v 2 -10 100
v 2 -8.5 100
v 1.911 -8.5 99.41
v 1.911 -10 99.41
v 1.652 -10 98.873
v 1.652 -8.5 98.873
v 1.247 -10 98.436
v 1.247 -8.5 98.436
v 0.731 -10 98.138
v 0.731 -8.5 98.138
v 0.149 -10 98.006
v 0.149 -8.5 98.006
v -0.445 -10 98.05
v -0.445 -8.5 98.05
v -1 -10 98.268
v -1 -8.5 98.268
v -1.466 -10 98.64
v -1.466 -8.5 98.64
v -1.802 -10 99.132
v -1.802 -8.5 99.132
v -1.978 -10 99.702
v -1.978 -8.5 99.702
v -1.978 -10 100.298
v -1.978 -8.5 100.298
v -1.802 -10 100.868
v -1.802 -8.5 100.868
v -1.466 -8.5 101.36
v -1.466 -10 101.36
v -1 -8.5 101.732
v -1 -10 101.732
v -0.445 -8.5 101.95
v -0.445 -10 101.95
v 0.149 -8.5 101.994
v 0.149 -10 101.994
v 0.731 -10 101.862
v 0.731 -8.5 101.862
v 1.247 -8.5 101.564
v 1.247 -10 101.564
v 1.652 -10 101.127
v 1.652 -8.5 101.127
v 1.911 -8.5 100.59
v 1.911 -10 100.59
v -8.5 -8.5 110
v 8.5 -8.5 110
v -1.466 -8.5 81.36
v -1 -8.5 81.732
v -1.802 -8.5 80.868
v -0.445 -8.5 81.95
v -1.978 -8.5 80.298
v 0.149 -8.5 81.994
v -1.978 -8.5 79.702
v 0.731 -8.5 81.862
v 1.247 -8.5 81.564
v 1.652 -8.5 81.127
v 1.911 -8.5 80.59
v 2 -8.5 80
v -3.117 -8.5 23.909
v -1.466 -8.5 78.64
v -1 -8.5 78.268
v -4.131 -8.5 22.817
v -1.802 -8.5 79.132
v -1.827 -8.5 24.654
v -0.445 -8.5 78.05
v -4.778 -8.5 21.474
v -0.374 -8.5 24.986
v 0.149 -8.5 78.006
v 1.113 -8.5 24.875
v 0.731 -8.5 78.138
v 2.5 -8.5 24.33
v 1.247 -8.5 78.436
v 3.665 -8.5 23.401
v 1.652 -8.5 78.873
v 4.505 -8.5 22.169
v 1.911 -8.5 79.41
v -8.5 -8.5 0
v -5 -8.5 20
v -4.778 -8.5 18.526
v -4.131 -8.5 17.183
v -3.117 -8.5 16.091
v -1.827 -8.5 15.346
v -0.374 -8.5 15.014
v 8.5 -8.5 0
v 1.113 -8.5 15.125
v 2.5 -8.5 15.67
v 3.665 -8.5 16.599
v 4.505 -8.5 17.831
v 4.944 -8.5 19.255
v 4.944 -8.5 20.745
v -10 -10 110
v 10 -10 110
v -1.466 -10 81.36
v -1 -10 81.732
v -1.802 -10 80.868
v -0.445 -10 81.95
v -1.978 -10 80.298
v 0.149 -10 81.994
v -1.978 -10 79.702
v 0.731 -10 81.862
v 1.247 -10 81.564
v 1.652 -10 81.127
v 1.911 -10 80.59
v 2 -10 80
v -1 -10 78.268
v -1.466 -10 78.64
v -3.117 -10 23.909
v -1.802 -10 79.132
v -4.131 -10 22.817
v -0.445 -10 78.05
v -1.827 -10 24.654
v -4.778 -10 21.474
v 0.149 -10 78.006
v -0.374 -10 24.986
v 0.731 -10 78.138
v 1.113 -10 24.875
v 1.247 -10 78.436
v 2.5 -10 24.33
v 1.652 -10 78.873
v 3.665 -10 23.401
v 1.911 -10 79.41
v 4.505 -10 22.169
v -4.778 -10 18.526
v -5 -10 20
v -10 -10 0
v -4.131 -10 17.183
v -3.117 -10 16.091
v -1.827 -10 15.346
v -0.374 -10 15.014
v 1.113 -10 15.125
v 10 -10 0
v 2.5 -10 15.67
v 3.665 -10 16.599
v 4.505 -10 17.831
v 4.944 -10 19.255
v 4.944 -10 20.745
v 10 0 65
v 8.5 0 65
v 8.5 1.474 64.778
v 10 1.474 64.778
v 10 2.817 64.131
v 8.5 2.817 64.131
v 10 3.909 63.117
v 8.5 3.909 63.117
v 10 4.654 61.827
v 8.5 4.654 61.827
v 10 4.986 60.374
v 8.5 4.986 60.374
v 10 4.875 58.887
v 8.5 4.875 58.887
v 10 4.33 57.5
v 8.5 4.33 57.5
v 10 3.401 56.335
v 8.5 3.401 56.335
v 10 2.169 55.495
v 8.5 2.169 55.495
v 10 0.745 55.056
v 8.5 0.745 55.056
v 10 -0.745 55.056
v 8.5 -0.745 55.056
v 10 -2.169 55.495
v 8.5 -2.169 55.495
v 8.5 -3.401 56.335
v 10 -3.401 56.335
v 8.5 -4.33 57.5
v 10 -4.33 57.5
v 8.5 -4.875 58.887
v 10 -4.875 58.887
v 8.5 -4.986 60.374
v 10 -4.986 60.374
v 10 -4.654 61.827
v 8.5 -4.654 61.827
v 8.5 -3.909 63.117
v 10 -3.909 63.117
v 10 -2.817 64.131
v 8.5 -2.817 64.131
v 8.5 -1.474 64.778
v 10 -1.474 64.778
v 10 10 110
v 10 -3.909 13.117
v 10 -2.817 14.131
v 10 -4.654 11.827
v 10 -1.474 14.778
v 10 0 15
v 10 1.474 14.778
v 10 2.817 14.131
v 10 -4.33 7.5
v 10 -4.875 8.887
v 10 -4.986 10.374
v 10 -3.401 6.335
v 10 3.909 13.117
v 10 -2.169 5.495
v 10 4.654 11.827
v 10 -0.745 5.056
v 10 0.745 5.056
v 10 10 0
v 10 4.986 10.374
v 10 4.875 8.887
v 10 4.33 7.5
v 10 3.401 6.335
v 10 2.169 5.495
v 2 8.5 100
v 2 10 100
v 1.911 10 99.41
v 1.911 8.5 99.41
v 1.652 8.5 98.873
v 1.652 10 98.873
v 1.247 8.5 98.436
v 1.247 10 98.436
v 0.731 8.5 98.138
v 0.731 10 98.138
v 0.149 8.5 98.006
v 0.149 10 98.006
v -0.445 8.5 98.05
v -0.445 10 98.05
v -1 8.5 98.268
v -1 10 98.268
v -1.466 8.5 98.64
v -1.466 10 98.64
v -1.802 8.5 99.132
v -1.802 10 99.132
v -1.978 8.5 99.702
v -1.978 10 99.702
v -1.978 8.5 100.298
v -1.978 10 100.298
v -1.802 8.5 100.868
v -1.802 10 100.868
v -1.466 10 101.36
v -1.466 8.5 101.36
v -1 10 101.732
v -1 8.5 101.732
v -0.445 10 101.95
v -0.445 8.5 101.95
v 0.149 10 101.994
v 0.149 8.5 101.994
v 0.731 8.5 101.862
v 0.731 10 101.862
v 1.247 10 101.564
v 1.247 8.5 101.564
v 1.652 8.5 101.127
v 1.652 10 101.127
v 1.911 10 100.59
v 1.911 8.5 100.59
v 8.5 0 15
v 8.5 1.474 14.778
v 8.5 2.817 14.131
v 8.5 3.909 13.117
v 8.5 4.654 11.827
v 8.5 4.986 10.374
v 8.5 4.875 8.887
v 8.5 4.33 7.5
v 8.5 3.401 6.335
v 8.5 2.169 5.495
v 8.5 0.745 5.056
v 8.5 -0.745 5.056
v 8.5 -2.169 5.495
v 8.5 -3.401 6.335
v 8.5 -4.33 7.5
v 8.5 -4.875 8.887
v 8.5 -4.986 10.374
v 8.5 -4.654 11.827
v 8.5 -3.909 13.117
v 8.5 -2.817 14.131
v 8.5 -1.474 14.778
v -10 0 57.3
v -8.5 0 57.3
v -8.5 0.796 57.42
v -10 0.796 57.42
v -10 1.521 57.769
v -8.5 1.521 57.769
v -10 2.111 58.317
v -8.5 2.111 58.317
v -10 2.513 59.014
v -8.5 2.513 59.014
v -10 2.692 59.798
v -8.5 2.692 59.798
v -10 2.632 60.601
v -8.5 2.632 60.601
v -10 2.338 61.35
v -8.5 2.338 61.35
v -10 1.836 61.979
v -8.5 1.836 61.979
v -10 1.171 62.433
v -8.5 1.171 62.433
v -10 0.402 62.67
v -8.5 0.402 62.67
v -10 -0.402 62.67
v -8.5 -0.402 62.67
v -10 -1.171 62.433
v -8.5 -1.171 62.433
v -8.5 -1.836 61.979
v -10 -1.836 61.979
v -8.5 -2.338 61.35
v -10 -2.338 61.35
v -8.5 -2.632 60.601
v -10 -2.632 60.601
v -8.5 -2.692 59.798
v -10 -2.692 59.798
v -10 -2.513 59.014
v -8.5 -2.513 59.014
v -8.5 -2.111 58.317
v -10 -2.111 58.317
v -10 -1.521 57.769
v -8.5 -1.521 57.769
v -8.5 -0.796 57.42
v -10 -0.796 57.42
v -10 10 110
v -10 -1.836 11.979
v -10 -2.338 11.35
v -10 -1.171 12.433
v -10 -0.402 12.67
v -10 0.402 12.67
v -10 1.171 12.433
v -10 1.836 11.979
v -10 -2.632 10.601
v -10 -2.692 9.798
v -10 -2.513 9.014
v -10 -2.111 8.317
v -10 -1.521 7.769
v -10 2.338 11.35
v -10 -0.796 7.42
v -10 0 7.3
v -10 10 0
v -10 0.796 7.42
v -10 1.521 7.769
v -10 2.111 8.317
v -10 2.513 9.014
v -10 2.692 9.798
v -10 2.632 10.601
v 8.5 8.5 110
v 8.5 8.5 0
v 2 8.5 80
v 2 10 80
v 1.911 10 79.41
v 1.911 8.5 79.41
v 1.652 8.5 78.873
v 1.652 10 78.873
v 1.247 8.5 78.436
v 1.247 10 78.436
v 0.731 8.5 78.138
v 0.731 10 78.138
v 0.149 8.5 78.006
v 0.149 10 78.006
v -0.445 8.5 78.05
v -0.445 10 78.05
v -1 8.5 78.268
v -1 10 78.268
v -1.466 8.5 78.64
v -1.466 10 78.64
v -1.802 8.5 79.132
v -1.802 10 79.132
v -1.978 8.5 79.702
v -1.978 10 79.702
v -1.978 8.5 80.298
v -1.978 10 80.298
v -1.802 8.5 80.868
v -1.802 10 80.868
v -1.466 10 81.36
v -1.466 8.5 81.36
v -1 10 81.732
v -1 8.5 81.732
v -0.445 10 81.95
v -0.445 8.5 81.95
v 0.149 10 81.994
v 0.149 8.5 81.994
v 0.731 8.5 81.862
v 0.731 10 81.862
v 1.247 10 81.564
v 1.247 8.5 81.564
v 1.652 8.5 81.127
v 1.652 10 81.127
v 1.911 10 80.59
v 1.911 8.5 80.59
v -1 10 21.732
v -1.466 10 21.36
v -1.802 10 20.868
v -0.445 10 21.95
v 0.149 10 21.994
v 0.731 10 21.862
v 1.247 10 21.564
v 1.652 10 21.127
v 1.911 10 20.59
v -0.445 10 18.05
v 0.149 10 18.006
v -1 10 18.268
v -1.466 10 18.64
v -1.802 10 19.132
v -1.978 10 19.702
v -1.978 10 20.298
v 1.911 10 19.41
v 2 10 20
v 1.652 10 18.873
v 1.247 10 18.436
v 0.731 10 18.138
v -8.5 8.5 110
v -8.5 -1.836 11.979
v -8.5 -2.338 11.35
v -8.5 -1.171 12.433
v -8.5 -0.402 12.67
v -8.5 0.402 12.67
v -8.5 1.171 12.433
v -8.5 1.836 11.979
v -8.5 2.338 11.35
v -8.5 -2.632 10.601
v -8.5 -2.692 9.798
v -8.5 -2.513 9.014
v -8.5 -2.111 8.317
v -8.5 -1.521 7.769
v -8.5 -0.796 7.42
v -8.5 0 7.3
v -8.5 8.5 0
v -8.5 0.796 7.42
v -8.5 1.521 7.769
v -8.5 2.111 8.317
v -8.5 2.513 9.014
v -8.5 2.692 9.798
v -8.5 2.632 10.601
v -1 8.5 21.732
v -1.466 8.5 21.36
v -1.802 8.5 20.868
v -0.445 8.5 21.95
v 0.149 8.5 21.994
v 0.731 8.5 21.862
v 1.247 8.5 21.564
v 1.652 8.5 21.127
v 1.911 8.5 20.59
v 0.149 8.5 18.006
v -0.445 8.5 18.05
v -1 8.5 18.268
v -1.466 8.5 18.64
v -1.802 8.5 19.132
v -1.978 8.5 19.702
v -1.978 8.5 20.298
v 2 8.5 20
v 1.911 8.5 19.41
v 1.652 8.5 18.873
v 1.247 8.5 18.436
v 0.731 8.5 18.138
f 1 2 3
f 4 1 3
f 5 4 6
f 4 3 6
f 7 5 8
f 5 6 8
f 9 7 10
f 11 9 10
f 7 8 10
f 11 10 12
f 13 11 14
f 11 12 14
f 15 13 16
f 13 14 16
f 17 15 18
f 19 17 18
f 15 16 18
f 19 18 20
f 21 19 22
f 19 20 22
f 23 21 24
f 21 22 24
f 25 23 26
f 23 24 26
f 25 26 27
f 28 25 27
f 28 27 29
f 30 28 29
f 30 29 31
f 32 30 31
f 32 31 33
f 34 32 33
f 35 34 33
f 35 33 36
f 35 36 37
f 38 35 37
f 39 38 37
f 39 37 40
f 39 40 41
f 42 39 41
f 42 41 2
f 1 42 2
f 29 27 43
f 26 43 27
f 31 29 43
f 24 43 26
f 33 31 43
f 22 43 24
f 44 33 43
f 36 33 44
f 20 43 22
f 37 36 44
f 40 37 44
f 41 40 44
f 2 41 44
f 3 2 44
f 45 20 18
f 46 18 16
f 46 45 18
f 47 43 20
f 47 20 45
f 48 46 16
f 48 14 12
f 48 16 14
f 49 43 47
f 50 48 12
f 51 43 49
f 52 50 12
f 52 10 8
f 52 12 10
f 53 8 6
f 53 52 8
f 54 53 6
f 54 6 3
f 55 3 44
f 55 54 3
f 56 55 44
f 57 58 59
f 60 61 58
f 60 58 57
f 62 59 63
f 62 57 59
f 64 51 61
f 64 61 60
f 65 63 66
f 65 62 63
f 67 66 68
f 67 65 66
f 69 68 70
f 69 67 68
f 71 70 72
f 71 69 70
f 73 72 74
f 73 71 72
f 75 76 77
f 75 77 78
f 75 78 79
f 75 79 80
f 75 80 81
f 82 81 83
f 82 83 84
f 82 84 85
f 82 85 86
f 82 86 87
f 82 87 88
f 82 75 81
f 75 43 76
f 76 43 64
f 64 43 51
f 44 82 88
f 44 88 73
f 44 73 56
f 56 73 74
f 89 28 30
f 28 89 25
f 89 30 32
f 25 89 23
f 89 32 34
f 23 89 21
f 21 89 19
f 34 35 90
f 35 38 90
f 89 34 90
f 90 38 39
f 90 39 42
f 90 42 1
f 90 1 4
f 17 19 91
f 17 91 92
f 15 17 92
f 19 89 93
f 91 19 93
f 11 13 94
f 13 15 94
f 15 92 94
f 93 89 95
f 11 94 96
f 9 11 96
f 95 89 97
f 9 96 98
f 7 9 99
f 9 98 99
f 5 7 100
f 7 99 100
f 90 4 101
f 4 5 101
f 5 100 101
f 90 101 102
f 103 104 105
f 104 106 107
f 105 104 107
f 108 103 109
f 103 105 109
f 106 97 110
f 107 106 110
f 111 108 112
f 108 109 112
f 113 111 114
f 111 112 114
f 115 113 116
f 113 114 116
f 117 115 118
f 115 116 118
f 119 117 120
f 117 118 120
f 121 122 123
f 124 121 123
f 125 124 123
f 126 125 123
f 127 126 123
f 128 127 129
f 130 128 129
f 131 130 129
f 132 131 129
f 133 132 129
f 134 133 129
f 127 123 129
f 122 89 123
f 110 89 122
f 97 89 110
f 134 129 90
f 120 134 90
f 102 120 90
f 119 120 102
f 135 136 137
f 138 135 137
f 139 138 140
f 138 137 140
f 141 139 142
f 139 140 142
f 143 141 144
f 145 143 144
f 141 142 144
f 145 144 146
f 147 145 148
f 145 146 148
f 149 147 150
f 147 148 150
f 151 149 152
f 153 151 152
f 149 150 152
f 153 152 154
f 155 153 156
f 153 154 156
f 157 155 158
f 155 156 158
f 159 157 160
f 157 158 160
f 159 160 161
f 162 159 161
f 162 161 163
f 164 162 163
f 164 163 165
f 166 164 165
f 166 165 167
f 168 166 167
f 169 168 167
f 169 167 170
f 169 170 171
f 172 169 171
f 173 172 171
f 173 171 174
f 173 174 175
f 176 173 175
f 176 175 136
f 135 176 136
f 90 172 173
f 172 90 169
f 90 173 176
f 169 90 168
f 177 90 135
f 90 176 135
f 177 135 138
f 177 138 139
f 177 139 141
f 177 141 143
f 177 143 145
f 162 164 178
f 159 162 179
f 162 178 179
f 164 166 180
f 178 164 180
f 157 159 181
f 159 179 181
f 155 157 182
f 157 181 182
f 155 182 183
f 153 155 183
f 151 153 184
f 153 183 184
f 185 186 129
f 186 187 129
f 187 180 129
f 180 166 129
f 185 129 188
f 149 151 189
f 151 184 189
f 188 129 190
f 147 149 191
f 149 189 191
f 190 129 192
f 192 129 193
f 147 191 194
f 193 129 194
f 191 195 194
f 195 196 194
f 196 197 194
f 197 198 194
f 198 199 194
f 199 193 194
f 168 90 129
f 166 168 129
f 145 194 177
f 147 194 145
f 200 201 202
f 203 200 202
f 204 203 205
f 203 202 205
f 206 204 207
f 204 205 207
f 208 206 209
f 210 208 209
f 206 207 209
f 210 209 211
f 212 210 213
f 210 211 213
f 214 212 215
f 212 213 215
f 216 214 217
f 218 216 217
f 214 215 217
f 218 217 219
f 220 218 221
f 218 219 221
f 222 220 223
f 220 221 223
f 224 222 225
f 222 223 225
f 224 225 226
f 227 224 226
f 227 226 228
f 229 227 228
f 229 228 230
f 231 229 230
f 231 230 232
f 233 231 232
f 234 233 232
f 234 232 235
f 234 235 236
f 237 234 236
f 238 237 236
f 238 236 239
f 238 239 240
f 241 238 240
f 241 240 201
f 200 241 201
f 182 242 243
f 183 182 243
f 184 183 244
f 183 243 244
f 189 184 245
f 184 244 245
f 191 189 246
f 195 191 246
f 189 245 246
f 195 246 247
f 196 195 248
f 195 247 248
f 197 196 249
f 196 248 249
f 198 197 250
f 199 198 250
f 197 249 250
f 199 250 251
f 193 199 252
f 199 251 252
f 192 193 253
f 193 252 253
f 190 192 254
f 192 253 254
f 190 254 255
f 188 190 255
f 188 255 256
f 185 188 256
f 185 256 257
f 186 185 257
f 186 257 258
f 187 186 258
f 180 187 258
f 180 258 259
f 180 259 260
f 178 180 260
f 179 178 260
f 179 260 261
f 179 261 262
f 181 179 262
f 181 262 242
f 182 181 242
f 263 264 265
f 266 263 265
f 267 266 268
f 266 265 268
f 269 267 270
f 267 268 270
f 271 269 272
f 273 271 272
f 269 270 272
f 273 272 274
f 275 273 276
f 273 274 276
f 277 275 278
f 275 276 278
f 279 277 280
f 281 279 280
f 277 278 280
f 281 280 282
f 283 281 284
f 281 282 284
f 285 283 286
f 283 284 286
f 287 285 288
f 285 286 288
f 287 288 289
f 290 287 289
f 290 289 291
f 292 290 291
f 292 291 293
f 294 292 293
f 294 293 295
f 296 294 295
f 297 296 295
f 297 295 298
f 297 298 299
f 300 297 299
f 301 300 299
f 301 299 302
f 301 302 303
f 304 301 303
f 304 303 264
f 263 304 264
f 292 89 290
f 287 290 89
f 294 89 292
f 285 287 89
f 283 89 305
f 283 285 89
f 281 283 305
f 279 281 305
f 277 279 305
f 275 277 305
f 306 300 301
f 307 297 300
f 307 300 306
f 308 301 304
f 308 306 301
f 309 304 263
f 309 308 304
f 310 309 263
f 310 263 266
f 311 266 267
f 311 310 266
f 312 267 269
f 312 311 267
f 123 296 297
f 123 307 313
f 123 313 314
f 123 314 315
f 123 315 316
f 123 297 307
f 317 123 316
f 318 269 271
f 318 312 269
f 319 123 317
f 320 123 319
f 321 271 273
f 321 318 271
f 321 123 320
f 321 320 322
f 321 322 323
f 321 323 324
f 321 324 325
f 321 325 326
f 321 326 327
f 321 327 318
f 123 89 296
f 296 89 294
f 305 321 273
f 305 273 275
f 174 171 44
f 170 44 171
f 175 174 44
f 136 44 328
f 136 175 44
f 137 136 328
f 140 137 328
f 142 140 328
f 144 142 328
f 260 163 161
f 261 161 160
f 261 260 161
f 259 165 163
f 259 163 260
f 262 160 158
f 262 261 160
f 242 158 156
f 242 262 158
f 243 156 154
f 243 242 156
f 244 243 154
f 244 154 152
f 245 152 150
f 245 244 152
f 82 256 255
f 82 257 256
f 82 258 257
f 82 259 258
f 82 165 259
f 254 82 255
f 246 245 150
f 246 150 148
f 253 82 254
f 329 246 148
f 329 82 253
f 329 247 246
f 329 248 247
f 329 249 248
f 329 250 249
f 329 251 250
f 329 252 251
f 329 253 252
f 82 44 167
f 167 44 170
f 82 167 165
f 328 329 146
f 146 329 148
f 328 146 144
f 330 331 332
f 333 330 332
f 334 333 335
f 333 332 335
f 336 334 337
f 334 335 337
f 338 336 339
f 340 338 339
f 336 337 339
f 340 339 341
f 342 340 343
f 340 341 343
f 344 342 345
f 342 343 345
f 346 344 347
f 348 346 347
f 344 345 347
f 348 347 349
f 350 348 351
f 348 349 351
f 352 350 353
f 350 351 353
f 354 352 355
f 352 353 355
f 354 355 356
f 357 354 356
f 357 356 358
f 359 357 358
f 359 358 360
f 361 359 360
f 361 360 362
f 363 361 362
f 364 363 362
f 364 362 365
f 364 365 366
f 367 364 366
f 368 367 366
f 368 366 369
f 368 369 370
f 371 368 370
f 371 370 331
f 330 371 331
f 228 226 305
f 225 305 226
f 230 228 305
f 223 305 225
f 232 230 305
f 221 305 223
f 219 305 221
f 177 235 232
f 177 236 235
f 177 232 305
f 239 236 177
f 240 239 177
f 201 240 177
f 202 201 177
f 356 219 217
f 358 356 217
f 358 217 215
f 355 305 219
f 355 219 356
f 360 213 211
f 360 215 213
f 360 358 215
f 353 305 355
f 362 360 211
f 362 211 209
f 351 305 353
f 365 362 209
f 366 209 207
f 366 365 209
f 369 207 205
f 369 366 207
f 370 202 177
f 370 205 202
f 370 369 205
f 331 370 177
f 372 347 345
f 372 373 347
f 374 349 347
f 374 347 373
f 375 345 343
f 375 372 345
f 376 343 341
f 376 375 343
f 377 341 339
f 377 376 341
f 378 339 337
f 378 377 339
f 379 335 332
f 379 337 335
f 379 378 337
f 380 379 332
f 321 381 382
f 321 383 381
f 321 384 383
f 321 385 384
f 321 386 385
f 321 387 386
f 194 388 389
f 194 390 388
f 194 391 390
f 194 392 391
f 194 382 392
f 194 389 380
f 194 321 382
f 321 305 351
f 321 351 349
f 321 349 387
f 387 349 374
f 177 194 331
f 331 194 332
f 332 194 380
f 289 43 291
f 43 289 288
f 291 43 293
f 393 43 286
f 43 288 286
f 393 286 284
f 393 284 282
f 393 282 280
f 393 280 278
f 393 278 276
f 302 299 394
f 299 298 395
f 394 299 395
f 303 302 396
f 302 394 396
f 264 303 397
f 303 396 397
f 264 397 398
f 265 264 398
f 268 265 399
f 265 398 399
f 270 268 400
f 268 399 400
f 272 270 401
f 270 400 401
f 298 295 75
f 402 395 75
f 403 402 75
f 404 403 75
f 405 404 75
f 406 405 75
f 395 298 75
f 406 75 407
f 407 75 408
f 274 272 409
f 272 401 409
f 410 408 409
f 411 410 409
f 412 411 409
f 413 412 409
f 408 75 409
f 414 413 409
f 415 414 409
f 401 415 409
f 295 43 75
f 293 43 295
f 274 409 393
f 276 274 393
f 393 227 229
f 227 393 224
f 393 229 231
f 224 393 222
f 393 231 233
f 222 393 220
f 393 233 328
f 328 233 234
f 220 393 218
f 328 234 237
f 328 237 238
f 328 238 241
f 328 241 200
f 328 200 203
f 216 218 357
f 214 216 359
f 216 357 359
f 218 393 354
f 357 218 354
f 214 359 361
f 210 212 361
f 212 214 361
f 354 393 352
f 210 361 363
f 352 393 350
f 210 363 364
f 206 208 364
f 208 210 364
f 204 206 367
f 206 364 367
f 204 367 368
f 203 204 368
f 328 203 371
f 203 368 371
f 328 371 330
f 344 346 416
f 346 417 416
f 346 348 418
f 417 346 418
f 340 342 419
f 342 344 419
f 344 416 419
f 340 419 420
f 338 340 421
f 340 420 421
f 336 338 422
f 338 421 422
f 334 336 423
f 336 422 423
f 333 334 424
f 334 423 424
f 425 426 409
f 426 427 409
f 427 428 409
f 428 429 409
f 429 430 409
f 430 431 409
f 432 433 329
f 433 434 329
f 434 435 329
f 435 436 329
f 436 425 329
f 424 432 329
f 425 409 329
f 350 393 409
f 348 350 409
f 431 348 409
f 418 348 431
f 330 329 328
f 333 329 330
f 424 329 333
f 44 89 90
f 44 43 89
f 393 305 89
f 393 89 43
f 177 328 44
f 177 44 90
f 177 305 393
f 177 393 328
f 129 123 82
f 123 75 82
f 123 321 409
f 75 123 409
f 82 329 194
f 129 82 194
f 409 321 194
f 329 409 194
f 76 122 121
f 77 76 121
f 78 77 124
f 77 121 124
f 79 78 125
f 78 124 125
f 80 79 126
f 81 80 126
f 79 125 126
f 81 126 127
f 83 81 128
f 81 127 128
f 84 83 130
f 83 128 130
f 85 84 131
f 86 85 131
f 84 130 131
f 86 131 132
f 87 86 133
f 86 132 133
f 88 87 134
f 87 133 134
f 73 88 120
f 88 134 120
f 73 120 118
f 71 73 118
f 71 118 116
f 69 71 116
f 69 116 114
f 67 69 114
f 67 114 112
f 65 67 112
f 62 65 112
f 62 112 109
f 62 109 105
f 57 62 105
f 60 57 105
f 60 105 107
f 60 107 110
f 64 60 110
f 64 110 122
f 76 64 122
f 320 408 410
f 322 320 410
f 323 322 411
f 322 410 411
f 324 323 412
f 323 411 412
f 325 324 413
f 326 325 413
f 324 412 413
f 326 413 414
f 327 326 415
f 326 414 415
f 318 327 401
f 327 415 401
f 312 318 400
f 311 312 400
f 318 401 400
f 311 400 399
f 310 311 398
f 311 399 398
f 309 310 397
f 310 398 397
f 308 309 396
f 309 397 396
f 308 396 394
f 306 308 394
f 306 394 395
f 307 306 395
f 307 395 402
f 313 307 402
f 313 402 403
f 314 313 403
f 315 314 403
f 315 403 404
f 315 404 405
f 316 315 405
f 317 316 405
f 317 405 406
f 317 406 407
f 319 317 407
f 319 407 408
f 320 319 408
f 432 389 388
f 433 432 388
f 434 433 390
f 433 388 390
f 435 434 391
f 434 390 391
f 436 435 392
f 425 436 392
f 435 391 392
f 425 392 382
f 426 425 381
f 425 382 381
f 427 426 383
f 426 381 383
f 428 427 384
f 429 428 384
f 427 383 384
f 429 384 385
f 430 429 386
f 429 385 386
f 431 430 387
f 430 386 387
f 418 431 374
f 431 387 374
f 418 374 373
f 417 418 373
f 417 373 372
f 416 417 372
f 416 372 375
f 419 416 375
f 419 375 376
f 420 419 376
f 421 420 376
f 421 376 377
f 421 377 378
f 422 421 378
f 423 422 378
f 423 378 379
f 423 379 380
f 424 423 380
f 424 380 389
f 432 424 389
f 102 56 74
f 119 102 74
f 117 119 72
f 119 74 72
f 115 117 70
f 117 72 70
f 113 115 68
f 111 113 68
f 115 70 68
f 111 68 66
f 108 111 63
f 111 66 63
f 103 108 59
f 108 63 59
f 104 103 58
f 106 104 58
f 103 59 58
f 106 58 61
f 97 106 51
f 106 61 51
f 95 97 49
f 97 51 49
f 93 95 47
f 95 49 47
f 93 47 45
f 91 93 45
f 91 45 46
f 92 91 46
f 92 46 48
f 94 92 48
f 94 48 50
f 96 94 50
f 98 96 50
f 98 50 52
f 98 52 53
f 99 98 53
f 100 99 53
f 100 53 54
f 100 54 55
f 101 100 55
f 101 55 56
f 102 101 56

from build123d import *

# Parameters (mm, degrees)
SKETCH_1_W          = 20
SKETCH_1_H          = 20
SKETCH_1_W_2        = 17
SKETCH_1_H_2        = 17
EXTRUDE_1_DEPTH     = 110
SKETCH_2_R          = 2.7
CUT_EXTRUDE_1_DEPTH = 25
SKETCH_3_R          = 2
CUT_EXTRUDE_2_DEPTH = 20
SKETCH_5_R          = 5
CUT_EXTRUDE_4_DEPTH = 10
CUT_EXTRUDE_START   = -10
SKETCH_6_R          = 5
CUT_EXTRUDE_5_DEPTH = 10


with BuildPart() as part:
    # ｽｹｯﾁ1 → ﾎﾞｽ - 押し出し1 (new body)
    with BuildSketch(Plane.XY):
        Rectangle(SKETCH_1_W, SKETCH_1_H)
        Rectangle(SKETCH_1_W_2, SKETCH_1_H_2, mode=Mode.SUBTRACT)
    extrude(amount=EXTRUDE_1_DEPTH)

    # ｽｹｯﾁ2 → ｶｯﾄ - 押し出し1 (cut)
    with BuildSketch(Plane(origin=(10, 0, 0), x_dir=(0, 0, -1), z_dir=(1, 0, 0))):
        with Locations((-60, 0)):
            Circle(SKETCH_2_R)
        with Locations((-10, 0)):
            Circle(SKETCH_2_R)
    extrude(amount=-CUT_EXTRUDE_1_DEPTH, mode=Mode.SUBTRACT)

    # ｽｹｯﾁ3 → ｶｯﾄ - 押し出し2 (cut)
    with BuildSketch(Plane(origin=(0, 10, 0), x_dir=(1, 0, 0), z_dir=(0, 1, 0))):
        with Locations((0, -100)):
            Circle(SKETCH_3_R)
        with Locations((0, -80)):
            Circle(SKETCH_3_R)
        with Locations((0, -20)):
            Circle(SKETCH_3_R)
    extrude(amount=-CUT_EXTRUDE_2_DEPTH, mode=Mode.SUBTRACT)

    # ｽｹｯﾁ5 → ｶｯﾄ - 押し出し4 (cut)
    with BuildSketch(Plane(origin=(0, -10, 0), x_dir=(-1, 0, 0), z_dir=(0, -1, 0))):
        with Locations((0, -20)):
            Circle(SKETCH_5_R)
    extrude(amount=-CUT_EXTRUDE_4_DEPTH, mode=Mode.SUBTRACT)

    # ｽｹｯﾁ6 → ｶｯﾄ - 押し出し5 (cut)
    with BuildSketch(Plane.ZY.offset(10).offset(CUT_EXTRUDE_START)):
        with Locations((10, 0)):
            Circle(SKETCH_6_R)
        with Locations((60, 0)):
            Circle(SKETCH_6_R)
    extrude(amount=-CUT_EXTRUDE_5_DEPTH, mode=Mode.SUBTRACT)


solid = part.part
